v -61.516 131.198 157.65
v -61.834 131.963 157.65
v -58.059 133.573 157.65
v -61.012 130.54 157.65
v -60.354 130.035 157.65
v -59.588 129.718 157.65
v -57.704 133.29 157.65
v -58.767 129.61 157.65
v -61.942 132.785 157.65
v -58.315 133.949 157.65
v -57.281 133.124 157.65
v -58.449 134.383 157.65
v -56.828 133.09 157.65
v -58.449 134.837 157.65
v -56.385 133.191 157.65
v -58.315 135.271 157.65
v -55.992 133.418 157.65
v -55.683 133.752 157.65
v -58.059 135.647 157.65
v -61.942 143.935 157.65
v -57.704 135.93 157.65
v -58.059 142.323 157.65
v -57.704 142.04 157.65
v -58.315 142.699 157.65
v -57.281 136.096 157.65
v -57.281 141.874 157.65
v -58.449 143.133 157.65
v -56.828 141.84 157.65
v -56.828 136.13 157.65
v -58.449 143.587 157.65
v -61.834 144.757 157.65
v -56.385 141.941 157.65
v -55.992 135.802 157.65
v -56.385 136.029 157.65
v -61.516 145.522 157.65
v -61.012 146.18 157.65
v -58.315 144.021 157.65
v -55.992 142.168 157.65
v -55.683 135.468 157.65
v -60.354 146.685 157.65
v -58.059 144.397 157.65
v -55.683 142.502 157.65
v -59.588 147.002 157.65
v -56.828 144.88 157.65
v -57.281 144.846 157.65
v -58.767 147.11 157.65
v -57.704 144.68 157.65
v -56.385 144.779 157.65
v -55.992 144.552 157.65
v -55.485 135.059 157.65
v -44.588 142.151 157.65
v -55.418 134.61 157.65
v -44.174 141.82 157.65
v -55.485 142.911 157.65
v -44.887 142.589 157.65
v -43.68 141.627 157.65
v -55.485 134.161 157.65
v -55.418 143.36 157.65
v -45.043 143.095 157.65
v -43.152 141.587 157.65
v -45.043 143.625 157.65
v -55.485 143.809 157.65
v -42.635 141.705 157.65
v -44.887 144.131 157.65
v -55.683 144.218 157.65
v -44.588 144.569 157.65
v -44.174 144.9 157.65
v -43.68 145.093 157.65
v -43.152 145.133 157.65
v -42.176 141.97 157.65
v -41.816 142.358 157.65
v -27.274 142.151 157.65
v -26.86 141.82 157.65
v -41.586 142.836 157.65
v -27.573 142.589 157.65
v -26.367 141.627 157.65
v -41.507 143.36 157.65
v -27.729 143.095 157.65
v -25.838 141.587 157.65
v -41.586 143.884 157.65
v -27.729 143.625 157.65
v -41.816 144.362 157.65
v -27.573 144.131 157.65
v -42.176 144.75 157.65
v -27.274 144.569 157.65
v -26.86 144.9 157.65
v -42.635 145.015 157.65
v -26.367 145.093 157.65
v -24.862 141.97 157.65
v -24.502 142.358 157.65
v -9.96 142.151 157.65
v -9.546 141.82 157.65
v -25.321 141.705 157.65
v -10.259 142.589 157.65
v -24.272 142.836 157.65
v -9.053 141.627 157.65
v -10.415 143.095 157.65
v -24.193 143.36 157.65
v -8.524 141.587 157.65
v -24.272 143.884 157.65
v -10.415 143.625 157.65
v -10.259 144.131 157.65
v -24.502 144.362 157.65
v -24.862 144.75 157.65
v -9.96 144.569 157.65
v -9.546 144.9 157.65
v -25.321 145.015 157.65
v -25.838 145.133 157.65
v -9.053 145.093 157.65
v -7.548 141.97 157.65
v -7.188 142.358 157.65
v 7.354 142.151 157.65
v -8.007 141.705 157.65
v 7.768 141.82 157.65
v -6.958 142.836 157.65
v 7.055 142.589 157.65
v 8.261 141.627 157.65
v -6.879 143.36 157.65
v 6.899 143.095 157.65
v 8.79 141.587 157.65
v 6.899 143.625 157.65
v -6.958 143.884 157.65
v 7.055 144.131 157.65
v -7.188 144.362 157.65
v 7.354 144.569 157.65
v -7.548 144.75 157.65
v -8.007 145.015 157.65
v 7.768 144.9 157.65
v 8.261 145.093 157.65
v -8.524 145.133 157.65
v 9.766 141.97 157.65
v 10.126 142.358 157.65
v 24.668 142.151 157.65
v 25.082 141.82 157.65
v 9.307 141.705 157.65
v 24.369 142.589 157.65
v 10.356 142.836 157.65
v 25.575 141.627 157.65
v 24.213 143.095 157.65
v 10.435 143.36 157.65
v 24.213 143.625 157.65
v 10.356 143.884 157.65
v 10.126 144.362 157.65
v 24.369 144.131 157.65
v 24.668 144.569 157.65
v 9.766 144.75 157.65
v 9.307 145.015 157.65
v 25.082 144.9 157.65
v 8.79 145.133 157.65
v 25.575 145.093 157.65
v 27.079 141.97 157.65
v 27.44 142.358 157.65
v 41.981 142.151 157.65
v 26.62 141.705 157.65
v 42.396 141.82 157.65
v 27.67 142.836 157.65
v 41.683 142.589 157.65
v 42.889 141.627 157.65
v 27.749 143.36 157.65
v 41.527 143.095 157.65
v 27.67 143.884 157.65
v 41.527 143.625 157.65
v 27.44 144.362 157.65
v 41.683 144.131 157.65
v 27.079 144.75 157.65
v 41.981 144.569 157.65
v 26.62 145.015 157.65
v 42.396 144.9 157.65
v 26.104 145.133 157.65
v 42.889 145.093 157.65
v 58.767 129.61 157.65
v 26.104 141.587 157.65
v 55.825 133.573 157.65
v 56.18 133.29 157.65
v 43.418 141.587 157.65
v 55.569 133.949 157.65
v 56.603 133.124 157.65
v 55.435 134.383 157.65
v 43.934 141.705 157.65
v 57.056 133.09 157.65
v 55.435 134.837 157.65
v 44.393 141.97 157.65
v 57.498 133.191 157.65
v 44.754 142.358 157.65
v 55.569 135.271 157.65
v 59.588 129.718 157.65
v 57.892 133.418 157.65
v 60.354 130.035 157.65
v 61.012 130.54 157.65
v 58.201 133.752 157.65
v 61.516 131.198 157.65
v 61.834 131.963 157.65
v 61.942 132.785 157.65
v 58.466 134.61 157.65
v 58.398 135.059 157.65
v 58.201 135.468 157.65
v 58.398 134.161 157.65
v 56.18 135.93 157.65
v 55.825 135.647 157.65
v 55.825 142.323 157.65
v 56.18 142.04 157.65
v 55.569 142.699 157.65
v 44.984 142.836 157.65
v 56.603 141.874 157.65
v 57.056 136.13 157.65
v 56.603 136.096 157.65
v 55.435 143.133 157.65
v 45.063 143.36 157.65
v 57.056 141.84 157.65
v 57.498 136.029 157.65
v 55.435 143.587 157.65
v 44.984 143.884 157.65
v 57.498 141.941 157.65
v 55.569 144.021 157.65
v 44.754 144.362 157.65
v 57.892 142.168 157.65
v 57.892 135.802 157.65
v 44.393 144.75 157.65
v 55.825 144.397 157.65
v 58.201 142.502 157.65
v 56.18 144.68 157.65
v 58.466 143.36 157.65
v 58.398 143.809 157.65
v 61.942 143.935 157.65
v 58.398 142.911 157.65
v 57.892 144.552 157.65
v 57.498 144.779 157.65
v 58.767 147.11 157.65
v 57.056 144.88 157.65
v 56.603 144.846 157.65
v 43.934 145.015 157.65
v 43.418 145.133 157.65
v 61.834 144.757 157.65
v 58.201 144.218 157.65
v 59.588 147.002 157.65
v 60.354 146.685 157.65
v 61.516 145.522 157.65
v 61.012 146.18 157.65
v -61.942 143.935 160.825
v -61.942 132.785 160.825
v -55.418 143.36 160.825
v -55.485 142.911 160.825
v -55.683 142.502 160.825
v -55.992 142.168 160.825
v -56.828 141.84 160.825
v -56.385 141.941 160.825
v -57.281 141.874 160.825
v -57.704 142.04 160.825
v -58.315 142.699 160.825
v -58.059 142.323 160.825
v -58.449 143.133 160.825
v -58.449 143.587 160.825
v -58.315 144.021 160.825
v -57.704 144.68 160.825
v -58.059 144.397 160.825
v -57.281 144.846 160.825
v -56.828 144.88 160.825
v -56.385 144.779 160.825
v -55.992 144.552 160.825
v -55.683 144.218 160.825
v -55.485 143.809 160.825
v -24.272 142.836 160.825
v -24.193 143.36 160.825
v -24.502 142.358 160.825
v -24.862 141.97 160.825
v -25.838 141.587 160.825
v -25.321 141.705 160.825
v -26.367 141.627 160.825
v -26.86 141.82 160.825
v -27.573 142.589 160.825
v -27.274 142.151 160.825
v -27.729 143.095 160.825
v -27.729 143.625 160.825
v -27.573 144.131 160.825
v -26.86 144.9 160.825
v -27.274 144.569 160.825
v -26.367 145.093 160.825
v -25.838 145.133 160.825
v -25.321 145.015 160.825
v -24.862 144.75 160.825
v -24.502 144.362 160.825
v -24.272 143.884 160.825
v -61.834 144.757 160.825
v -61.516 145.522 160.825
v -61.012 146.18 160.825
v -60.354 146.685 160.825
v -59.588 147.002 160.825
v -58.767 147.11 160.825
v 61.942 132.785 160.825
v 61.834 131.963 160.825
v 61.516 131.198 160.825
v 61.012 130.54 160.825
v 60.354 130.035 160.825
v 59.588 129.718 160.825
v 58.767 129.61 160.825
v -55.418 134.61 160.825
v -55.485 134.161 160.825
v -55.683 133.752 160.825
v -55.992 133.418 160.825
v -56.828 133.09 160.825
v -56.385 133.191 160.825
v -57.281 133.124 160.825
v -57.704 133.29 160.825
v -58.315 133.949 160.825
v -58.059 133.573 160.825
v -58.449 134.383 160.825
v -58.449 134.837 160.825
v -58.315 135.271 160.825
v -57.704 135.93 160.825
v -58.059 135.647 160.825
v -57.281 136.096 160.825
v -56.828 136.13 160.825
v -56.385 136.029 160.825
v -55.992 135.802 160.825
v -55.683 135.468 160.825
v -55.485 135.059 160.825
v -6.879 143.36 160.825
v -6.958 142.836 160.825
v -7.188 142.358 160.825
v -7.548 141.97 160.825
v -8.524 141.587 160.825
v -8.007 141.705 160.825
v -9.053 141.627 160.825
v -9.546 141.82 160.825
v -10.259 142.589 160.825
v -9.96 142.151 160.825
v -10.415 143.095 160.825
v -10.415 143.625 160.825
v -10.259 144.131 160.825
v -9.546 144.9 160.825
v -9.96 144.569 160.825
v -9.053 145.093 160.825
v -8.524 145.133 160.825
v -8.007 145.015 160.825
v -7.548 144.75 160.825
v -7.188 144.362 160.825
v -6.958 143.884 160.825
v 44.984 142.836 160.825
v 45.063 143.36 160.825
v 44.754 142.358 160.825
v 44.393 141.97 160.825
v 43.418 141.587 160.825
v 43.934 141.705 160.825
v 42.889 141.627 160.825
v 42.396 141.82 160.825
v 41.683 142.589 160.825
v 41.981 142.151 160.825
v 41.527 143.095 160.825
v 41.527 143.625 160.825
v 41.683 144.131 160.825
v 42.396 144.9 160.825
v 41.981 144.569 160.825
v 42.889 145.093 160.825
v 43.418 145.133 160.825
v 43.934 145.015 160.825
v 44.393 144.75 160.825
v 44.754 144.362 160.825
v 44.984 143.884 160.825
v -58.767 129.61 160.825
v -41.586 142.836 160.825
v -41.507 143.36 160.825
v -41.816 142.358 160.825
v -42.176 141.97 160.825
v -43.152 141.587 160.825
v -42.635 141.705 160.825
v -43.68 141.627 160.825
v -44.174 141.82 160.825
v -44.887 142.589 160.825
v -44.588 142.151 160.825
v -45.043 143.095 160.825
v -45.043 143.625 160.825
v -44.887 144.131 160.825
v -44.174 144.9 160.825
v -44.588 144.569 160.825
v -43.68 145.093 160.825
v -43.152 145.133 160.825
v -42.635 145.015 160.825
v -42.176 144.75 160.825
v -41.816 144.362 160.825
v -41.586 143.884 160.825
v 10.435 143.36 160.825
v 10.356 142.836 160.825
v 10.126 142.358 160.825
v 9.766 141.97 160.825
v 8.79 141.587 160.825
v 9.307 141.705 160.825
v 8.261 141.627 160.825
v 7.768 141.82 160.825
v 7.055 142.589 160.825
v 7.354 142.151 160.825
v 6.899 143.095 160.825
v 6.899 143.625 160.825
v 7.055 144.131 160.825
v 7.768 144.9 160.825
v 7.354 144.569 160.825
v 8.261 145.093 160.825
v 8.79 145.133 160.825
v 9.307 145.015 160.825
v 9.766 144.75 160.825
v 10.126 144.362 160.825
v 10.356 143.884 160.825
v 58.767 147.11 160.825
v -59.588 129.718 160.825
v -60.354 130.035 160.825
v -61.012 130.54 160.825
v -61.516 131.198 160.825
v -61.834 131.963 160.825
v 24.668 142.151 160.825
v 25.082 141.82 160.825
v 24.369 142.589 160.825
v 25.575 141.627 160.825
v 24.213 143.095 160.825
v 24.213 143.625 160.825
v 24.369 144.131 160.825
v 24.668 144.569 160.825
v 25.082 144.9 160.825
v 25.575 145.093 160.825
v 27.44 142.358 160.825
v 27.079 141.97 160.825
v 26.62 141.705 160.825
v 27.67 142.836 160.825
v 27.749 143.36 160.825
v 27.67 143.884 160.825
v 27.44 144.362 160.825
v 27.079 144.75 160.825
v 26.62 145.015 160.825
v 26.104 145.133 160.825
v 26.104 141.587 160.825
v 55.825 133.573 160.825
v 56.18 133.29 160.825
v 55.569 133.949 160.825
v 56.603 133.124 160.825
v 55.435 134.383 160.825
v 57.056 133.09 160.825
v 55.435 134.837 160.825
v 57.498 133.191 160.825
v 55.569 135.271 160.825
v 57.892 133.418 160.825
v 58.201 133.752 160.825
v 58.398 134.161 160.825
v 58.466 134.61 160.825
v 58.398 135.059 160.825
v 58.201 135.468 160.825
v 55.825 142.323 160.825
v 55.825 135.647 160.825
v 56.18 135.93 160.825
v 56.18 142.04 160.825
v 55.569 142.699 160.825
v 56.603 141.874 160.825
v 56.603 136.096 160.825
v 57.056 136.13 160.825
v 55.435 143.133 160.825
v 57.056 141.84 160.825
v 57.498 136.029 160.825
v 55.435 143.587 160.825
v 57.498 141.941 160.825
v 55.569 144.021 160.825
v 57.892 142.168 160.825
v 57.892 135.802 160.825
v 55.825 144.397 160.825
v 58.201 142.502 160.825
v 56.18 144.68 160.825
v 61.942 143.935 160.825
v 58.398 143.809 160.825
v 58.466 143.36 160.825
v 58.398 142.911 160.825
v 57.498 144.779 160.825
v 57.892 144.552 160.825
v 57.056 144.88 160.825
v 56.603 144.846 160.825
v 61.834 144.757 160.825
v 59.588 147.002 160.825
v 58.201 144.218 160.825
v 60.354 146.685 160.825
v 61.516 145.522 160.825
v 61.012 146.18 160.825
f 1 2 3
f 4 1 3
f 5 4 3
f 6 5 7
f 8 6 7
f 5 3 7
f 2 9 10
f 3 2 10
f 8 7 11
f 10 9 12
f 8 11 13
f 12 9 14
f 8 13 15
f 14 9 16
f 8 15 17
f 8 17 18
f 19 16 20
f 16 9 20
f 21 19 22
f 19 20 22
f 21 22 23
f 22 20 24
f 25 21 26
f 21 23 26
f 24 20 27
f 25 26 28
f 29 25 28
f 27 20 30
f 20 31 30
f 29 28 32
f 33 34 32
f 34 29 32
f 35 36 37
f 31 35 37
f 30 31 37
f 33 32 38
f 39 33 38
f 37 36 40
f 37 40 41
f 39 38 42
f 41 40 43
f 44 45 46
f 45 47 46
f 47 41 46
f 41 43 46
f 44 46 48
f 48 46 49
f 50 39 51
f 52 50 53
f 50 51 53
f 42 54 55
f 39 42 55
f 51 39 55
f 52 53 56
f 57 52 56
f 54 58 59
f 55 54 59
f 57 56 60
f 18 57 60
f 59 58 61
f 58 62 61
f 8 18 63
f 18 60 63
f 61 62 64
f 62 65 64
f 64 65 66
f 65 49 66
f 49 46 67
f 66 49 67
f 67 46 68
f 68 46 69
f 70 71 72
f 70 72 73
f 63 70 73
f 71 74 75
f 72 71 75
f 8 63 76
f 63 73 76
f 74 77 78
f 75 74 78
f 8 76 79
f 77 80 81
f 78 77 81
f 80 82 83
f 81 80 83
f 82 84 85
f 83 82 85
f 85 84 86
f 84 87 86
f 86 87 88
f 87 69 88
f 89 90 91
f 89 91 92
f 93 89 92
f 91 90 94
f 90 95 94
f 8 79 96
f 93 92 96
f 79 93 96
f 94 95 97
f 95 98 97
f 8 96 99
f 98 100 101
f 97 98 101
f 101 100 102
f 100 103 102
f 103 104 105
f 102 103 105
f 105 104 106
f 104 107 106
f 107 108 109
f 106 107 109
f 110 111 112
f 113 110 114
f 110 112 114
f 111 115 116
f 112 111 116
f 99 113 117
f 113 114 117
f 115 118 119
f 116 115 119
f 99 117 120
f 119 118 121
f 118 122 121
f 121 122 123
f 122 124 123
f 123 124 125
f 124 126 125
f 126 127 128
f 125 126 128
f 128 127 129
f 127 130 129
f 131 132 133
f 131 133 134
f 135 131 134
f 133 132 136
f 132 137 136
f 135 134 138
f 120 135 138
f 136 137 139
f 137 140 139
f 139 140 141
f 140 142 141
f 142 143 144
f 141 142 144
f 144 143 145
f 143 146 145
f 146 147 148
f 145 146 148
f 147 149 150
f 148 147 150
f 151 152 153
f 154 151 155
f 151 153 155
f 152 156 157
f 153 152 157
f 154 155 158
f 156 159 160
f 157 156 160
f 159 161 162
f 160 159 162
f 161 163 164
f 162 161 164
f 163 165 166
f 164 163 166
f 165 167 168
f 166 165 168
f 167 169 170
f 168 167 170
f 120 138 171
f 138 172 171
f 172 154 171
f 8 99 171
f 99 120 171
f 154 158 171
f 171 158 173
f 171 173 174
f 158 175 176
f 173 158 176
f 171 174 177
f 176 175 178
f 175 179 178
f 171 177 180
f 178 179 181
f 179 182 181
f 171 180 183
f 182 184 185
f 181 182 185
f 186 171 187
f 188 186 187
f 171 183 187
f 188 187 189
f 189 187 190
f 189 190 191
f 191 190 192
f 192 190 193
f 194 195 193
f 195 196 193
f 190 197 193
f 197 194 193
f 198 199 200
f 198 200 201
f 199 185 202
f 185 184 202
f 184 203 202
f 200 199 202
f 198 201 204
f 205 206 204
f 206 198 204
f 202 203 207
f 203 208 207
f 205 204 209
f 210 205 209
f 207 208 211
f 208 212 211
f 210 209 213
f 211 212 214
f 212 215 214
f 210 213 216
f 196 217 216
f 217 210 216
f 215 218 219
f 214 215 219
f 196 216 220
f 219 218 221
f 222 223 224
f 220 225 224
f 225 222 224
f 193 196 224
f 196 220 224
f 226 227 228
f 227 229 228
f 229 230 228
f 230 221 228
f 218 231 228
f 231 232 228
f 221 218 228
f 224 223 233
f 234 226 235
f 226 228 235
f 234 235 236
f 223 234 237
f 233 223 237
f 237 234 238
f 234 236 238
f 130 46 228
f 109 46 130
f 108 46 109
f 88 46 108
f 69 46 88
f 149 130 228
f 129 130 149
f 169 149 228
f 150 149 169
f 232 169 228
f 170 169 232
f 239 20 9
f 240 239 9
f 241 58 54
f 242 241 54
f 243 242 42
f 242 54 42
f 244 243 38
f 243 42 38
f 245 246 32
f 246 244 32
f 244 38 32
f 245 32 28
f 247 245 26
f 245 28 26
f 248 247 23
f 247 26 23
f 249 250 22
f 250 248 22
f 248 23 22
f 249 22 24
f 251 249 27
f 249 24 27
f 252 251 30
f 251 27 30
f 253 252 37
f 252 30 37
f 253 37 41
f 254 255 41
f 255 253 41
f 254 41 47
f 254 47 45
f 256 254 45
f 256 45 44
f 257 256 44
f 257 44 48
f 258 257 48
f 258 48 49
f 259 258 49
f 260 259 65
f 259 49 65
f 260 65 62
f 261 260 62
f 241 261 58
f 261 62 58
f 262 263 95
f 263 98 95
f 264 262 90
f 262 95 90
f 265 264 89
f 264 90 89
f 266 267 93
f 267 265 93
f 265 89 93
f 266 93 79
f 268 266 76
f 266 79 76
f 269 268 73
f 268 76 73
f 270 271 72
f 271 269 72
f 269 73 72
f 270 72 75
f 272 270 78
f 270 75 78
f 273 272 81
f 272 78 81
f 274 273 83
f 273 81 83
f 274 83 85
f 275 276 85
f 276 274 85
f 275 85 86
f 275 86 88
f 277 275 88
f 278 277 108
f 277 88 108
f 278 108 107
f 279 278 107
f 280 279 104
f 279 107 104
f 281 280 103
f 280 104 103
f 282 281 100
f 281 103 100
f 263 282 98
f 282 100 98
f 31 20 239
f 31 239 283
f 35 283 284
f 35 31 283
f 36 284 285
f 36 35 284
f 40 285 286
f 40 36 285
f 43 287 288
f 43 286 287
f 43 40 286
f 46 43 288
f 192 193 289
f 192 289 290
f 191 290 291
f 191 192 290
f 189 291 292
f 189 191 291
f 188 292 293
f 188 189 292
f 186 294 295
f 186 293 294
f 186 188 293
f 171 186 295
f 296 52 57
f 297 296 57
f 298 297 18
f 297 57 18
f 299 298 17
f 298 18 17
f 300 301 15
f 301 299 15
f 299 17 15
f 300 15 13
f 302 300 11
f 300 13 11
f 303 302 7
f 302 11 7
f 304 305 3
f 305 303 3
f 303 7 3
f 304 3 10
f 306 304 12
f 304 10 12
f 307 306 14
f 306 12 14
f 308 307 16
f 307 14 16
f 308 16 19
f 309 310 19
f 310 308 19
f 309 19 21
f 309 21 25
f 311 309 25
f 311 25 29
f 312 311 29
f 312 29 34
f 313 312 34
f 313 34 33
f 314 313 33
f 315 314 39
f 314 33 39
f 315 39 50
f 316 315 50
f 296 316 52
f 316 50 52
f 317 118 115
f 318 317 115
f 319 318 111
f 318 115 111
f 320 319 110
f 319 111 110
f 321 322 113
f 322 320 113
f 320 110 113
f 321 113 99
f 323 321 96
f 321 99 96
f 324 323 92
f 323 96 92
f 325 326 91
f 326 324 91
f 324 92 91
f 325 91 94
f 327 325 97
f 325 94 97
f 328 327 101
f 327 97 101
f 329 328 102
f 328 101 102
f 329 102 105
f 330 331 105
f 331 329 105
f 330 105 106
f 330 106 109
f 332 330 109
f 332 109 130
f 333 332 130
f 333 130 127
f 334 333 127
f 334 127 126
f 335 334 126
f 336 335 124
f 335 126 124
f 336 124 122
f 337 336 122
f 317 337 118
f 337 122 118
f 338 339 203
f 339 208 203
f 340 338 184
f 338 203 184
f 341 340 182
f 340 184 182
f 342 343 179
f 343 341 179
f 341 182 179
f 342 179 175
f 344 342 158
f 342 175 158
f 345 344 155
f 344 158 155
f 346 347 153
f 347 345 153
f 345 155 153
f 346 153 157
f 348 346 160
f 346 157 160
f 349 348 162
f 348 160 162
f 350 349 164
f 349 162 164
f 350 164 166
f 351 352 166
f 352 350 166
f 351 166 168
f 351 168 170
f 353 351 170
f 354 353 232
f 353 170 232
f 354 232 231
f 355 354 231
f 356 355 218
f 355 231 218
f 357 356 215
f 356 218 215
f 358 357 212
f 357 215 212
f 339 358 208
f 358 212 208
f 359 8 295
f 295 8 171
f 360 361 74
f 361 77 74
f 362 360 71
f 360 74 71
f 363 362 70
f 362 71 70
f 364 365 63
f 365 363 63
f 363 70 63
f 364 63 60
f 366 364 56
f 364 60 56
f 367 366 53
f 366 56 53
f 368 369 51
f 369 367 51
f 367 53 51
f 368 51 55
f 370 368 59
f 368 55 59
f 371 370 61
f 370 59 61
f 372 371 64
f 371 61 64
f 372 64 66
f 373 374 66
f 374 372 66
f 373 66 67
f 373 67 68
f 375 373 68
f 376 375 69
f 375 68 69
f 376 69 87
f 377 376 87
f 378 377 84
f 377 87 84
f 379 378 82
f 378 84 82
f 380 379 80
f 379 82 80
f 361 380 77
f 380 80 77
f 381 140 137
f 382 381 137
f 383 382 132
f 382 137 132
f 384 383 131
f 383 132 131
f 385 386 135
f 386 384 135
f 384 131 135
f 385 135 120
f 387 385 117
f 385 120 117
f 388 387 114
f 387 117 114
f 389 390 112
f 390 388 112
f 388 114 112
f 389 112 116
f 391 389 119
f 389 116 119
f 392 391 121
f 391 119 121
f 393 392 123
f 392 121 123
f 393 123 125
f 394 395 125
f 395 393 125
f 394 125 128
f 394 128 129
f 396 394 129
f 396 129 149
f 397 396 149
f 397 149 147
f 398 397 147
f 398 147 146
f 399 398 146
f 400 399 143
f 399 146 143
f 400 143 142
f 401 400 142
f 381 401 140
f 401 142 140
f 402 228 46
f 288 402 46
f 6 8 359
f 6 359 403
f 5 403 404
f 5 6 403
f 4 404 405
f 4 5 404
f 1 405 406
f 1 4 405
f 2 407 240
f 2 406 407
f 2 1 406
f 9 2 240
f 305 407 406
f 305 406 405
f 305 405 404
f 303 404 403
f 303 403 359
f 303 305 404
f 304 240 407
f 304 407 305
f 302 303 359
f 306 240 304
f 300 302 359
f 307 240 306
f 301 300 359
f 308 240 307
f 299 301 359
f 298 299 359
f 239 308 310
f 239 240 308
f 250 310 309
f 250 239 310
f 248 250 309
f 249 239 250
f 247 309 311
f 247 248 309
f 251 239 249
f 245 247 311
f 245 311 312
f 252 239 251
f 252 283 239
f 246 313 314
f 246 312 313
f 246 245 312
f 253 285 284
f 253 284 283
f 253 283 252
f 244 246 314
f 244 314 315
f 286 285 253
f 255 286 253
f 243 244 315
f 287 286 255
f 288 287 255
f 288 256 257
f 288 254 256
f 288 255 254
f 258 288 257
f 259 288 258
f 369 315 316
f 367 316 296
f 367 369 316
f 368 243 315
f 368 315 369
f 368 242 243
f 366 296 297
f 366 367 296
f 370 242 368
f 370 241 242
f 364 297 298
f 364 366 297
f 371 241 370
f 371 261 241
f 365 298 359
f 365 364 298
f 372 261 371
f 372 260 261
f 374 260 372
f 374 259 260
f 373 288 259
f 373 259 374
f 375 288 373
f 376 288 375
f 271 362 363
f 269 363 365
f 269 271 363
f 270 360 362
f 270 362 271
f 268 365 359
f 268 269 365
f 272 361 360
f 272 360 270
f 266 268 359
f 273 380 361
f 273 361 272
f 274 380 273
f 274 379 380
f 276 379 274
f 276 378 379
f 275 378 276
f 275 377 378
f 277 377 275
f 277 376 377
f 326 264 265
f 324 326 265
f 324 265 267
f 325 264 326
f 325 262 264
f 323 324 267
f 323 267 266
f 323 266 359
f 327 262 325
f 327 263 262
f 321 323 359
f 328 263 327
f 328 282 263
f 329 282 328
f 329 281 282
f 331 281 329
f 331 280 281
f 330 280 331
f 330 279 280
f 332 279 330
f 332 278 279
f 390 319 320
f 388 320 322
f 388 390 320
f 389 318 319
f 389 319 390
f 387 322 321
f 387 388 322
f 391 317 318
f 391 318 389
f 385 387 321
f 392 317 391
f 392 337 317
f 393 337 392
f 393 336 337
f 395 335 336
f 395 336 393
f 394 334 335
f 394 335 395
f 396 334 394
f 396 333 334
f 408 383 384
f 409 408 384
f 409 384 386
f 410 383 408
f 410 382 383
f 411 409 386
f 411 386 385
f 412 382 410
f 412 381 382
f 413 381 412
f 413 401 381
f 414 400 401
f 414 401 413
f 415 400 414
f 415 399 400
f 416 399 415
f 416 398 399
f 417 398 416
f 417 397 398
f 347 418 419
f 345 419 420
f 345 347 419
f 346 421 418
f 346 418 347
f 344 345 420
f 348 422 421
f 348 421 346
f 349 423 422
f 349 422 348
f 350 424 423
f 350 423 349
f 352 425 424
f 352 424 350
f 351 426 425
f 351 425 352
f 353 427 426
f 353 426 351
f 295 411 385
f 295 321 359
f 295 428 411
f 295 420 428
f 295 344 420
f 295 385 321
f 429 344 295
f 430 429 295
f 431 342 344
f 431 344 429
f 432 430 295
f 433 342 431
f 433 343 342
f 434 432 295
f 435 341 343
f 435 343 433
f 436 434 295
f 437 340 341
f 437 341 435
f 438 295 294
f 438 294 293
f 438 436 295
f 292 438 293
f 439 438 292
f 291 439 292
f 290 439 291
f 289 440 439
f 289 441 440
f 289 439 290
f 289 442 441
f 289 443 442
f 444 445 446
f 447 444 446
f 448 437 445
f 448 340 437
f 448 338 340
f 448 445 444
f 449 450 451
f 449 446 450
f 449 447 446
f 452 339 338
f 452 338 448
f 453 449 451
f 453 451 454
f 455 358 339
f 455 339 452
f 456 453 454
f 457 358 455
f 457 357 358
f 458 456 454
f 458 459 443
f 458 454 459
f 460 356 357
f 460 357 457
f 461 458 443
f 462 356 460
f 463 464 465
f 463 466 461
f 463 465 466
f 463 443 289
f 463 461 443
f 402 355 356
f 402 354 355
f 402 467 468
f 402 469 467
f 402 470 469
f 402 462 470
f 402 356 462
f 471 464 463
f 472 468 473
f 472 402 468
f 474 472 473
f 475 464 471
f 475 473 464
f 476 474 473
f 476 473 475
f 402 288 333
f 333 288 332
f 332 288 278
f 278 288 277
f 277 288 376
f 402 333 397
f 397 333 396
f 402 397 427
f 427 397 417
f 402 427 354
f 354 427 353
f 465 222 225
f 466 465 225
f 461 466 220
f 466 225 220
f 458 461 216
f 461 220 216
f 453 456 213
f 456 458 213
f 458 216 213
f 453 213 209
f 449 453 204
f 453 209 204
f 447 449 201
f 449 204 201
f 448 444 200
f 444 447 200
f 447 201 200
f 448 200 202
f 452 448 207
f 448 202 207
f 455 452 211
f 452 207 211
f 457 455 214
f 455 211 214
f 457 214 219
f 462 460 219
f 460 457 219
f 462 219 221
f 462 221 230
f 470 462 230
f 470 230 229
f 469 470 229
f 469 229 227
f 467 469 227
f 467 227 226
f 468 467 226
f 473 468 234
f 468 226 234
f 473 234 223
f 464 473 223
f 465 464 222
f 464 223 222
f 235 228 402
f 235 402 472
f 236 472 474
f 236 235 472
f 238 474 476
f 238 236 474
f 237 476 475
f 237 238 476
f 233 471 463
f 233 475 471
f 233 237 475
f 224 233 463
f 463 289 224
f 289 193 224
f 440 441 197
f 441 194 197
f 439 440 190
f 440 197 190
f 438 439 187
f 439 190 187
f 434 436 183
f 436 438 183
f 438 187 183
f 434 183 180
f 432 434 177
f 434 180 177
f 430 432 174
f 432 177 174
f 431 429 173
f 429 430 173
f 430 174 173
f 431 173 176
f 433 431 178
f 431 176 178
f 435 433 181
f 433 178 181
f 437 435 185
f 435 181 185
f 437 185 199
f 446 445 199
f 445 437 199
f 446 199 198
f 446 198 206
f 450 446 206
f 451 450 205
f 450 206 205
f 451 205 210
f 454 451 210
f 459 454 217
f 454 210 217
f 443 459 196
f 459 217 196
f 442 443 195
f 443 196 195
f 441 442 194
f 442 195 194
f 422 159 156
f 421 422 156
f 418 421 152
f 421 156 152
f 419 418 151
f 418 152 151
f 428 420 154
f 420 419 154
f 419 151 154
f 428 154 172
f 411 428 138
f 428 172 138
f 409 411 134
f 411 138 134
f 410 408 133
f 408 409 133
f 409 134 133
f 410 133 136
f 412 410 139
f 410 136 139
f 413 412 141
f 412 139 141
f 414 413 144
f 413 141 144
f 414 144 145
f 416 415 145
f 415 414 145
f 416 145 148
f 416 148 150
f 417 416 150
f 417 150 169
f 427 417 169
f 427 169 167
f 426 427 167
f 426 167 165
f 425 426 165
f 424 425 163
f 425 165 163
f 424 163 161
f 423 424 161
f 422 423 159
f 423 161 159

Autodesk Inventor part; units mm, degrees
ref_plane "YZ Plane" through (0, 0, 0) normal (1, 0, 0) x (0, 1, 0)
ref_plane "XZ Plane" through (0, 0, 0) normal (0, 1, 0) x (-1, 0, 0)
ref_plane "XY Plane" through (0, 0, 0) normal (0, 0, 1) x (1, 0, 0)
ref_plane "Work Plane2" through (0, 147.11, 157.65) normal (0, 0, 1) x (1, 0, 0)
sketch "Sketch2" plane through (0, 147.11, 157.65) normal (0, 0, 1) x (1, 0, 0)
  arc A0 (61.9417, -3.175) -> (58.7667, 0) centre (58.7667, -3.175) ccw projected
  line L0 (58.7667, 0) -> (55.1167, 0) projected
  arc A1 (51.9417, 3.175) -> (55.1167, 0) centre (55.1167, 3.175) ccw projected
  arc A2 (51.9417, 3.937) -> (48.7667, 7.112) centre (48.7667, 3.937) ccw projected
  line L1 (48.7667, 7.112) -> (-48.7667, 7.112) projected
  arc A3 (-48.7667, 7.112) -> (-51.9417, 3.937) centre (-48.7667, 3.937) ccw projected
  arc A4 (-55.1167, 0) -> (-51.9417, 3.175) centre (-55.1167, 3.175) ccw projected
  line L2 (-55.1167, 0) -> (-58.7667, 0) projected
  arc A5 (-58.7667, 0) -> (-61.9417, -3.175) centre (-58.7667, -3.175) ccw projected
  line L3 (-61.9417, -3.175) -> (-61.9417, -14.325) projected
  arc A6 (-61.9417, -14.325) -> (-58.7667, -17.5) centre (-58.7667, -14.325) ccw projected
  line L4 (-58.7667, -17.5) -> (58.7667, -17.5) projected
  arc A7 (58.7667, -17.5) -> (61.9417, -14.325) centre (58.7667, -14.325) ccw projected
  line L5 (61.9417, -14.325) -> (61.9417, -3.175) projected
  arc A8 (-44.4178, 0) -> (-42.1518, 0) centre (-43.2848, 0) ccw projected
  line L6 (-44.4178, 0) -> (-44.4178, 5) projected
  arc A9 (-42.1518, 5) -> (-44.4178, 5) centre (-43.2848, 5) ccw projected
  line L7 (-42.1518, 5) -> (-42.1518, 0) projected
  circle A10 centre (56.9417, -12.5) radius 1.524 projected
  circle A11 centre (-56.9417, -3.75) radius 1.524 projected
  circle A12 centre (56.9417, -3.75) radius 1.524 projected
  circle A13 centre (-43.2848, -3.75) radius 1.27 projected
  circle A14 centre (-25.9709, -3.75) radius 1.27 projected
  circle A15 centre (-8.657, -3.75) radius 1.27 projected
  circle A16 centre (8.657, -3.75) radius 1.27 projected
  circle A17 centre (25.9709, -3.75) radius 1.27 projected
  circle A18 centre (43.2848, -3.75) radius 1.27 projected
  circle A19 centre (-56.9417, -12.5) radius 1.524 projected
  arc A20 (-27.1039, 0) -> (-24.8379, 0) centre (-25.9709, 0) ccw projected
  line L8 (-27.1039, 0) -> (-27.1039, 5) projected
  arc A21 (-24.8379, 5) -> (-27.1039, 5) centre (-25.9709, 5) ccw projected
  line L9 (-24.8379, 5) -> (-24.8379, 0) projected
  arc A22 (-9.79, 0) -> (-7.524, 0) centre (-8.657, 0) ccw projected
  line L10 (-9.79, 0) -> (-9.79, 5) projected
  arc A23 (-7.524, 5) -> (-9.79, 5) centre (-8.657, 5) ccw projected
  line L11 (-7.524, 5) -> (-7.524, 0) projected
  arc A24 (7.524, 0) -> (9.79, 0) centre (8.657, 0) ccw projected
  line L12 (7.524, 0) -> (7.524, 5) projected
  arc A25 (9.79, 5) -> (7.524, 5) centre (8.657, 5) ccw projected
  line L13 (9.79, 5) -> (9.79, 0) projected
  arc A26 (24.8379, 0) -> (27.1039, 0) centre (25.9709, 0) ccw projected
  line L14 (24.8379, 0) -> (24.8379, 5) projected
  arc A27 (27.1039, 5) -> (24.8379, 5) centre (25.9709, 5) ccw projected
  line L15 (27.1039, 5) -> (27.1039, 0) projected
  arc A28 (42.1518, 0) -> (44.4178, 0) centre (43.2848, 0) ccw projected
  line L16 (42.1518, 0) -> (42.1518, 5) projected
  arc A29 (44.4178, 5) -> (42.1518, 5) centre (43.2848, 5) ccw projected
  line L17 (44.4178, 5) -> (44.4178, 0) projected
  line L18 (-55.1167, 0) -> (55.1167, 0)
  circle A30 centre (-43.2848, -3.75) radius 1.778
  circle A31 centre (-25.9709, -3.75) radius 1.778
  circle A32 centre (-8.657, -3.75) radius 1.778
  circle A33 centre (8.657, -3.75) radius 1.778
  circle A34 centre (25.9709, -3.75) radius 1.778
  circle A35 centre (43.2848, -3.75) radius 1.778
  line L19 (-54.3979, -17.5) -> (54.3979, -17.5)
  line L20 (51.9417, 3.175) -> (51.9417, 3.937) projected
  line L21 (-51.9417, 3.937) -> (-51.9417, 3.175) projected
  point P0 (0, -147.11)
  point P1 (-55.1167, 3.175)
  point P2 (51.9417, 3.683)
  point P3 (-51.9417, 3.683)
  point P4 (-55.1167, 3.175)
  dimension "d0" = 3.556
  dimension "d1" = 3.556
  dimension "d2" = 3.556
  dimension "d3" = 3.556
  dimension "d4" = 3.556
  dimension "d5" = 3.556
extrude "Extrusion1" add sketch "Sketch2" along normal blind 3.175 contours L5 A7 L4 A6 L3 A5 L2 L18 A8 A20 A22 A24 A26 A28 L0 A0 | A28 L18 | A26 L18 | A24 L18 | A22 L18 | L18 A8 | A20 L18
properties part number "string_mount"
